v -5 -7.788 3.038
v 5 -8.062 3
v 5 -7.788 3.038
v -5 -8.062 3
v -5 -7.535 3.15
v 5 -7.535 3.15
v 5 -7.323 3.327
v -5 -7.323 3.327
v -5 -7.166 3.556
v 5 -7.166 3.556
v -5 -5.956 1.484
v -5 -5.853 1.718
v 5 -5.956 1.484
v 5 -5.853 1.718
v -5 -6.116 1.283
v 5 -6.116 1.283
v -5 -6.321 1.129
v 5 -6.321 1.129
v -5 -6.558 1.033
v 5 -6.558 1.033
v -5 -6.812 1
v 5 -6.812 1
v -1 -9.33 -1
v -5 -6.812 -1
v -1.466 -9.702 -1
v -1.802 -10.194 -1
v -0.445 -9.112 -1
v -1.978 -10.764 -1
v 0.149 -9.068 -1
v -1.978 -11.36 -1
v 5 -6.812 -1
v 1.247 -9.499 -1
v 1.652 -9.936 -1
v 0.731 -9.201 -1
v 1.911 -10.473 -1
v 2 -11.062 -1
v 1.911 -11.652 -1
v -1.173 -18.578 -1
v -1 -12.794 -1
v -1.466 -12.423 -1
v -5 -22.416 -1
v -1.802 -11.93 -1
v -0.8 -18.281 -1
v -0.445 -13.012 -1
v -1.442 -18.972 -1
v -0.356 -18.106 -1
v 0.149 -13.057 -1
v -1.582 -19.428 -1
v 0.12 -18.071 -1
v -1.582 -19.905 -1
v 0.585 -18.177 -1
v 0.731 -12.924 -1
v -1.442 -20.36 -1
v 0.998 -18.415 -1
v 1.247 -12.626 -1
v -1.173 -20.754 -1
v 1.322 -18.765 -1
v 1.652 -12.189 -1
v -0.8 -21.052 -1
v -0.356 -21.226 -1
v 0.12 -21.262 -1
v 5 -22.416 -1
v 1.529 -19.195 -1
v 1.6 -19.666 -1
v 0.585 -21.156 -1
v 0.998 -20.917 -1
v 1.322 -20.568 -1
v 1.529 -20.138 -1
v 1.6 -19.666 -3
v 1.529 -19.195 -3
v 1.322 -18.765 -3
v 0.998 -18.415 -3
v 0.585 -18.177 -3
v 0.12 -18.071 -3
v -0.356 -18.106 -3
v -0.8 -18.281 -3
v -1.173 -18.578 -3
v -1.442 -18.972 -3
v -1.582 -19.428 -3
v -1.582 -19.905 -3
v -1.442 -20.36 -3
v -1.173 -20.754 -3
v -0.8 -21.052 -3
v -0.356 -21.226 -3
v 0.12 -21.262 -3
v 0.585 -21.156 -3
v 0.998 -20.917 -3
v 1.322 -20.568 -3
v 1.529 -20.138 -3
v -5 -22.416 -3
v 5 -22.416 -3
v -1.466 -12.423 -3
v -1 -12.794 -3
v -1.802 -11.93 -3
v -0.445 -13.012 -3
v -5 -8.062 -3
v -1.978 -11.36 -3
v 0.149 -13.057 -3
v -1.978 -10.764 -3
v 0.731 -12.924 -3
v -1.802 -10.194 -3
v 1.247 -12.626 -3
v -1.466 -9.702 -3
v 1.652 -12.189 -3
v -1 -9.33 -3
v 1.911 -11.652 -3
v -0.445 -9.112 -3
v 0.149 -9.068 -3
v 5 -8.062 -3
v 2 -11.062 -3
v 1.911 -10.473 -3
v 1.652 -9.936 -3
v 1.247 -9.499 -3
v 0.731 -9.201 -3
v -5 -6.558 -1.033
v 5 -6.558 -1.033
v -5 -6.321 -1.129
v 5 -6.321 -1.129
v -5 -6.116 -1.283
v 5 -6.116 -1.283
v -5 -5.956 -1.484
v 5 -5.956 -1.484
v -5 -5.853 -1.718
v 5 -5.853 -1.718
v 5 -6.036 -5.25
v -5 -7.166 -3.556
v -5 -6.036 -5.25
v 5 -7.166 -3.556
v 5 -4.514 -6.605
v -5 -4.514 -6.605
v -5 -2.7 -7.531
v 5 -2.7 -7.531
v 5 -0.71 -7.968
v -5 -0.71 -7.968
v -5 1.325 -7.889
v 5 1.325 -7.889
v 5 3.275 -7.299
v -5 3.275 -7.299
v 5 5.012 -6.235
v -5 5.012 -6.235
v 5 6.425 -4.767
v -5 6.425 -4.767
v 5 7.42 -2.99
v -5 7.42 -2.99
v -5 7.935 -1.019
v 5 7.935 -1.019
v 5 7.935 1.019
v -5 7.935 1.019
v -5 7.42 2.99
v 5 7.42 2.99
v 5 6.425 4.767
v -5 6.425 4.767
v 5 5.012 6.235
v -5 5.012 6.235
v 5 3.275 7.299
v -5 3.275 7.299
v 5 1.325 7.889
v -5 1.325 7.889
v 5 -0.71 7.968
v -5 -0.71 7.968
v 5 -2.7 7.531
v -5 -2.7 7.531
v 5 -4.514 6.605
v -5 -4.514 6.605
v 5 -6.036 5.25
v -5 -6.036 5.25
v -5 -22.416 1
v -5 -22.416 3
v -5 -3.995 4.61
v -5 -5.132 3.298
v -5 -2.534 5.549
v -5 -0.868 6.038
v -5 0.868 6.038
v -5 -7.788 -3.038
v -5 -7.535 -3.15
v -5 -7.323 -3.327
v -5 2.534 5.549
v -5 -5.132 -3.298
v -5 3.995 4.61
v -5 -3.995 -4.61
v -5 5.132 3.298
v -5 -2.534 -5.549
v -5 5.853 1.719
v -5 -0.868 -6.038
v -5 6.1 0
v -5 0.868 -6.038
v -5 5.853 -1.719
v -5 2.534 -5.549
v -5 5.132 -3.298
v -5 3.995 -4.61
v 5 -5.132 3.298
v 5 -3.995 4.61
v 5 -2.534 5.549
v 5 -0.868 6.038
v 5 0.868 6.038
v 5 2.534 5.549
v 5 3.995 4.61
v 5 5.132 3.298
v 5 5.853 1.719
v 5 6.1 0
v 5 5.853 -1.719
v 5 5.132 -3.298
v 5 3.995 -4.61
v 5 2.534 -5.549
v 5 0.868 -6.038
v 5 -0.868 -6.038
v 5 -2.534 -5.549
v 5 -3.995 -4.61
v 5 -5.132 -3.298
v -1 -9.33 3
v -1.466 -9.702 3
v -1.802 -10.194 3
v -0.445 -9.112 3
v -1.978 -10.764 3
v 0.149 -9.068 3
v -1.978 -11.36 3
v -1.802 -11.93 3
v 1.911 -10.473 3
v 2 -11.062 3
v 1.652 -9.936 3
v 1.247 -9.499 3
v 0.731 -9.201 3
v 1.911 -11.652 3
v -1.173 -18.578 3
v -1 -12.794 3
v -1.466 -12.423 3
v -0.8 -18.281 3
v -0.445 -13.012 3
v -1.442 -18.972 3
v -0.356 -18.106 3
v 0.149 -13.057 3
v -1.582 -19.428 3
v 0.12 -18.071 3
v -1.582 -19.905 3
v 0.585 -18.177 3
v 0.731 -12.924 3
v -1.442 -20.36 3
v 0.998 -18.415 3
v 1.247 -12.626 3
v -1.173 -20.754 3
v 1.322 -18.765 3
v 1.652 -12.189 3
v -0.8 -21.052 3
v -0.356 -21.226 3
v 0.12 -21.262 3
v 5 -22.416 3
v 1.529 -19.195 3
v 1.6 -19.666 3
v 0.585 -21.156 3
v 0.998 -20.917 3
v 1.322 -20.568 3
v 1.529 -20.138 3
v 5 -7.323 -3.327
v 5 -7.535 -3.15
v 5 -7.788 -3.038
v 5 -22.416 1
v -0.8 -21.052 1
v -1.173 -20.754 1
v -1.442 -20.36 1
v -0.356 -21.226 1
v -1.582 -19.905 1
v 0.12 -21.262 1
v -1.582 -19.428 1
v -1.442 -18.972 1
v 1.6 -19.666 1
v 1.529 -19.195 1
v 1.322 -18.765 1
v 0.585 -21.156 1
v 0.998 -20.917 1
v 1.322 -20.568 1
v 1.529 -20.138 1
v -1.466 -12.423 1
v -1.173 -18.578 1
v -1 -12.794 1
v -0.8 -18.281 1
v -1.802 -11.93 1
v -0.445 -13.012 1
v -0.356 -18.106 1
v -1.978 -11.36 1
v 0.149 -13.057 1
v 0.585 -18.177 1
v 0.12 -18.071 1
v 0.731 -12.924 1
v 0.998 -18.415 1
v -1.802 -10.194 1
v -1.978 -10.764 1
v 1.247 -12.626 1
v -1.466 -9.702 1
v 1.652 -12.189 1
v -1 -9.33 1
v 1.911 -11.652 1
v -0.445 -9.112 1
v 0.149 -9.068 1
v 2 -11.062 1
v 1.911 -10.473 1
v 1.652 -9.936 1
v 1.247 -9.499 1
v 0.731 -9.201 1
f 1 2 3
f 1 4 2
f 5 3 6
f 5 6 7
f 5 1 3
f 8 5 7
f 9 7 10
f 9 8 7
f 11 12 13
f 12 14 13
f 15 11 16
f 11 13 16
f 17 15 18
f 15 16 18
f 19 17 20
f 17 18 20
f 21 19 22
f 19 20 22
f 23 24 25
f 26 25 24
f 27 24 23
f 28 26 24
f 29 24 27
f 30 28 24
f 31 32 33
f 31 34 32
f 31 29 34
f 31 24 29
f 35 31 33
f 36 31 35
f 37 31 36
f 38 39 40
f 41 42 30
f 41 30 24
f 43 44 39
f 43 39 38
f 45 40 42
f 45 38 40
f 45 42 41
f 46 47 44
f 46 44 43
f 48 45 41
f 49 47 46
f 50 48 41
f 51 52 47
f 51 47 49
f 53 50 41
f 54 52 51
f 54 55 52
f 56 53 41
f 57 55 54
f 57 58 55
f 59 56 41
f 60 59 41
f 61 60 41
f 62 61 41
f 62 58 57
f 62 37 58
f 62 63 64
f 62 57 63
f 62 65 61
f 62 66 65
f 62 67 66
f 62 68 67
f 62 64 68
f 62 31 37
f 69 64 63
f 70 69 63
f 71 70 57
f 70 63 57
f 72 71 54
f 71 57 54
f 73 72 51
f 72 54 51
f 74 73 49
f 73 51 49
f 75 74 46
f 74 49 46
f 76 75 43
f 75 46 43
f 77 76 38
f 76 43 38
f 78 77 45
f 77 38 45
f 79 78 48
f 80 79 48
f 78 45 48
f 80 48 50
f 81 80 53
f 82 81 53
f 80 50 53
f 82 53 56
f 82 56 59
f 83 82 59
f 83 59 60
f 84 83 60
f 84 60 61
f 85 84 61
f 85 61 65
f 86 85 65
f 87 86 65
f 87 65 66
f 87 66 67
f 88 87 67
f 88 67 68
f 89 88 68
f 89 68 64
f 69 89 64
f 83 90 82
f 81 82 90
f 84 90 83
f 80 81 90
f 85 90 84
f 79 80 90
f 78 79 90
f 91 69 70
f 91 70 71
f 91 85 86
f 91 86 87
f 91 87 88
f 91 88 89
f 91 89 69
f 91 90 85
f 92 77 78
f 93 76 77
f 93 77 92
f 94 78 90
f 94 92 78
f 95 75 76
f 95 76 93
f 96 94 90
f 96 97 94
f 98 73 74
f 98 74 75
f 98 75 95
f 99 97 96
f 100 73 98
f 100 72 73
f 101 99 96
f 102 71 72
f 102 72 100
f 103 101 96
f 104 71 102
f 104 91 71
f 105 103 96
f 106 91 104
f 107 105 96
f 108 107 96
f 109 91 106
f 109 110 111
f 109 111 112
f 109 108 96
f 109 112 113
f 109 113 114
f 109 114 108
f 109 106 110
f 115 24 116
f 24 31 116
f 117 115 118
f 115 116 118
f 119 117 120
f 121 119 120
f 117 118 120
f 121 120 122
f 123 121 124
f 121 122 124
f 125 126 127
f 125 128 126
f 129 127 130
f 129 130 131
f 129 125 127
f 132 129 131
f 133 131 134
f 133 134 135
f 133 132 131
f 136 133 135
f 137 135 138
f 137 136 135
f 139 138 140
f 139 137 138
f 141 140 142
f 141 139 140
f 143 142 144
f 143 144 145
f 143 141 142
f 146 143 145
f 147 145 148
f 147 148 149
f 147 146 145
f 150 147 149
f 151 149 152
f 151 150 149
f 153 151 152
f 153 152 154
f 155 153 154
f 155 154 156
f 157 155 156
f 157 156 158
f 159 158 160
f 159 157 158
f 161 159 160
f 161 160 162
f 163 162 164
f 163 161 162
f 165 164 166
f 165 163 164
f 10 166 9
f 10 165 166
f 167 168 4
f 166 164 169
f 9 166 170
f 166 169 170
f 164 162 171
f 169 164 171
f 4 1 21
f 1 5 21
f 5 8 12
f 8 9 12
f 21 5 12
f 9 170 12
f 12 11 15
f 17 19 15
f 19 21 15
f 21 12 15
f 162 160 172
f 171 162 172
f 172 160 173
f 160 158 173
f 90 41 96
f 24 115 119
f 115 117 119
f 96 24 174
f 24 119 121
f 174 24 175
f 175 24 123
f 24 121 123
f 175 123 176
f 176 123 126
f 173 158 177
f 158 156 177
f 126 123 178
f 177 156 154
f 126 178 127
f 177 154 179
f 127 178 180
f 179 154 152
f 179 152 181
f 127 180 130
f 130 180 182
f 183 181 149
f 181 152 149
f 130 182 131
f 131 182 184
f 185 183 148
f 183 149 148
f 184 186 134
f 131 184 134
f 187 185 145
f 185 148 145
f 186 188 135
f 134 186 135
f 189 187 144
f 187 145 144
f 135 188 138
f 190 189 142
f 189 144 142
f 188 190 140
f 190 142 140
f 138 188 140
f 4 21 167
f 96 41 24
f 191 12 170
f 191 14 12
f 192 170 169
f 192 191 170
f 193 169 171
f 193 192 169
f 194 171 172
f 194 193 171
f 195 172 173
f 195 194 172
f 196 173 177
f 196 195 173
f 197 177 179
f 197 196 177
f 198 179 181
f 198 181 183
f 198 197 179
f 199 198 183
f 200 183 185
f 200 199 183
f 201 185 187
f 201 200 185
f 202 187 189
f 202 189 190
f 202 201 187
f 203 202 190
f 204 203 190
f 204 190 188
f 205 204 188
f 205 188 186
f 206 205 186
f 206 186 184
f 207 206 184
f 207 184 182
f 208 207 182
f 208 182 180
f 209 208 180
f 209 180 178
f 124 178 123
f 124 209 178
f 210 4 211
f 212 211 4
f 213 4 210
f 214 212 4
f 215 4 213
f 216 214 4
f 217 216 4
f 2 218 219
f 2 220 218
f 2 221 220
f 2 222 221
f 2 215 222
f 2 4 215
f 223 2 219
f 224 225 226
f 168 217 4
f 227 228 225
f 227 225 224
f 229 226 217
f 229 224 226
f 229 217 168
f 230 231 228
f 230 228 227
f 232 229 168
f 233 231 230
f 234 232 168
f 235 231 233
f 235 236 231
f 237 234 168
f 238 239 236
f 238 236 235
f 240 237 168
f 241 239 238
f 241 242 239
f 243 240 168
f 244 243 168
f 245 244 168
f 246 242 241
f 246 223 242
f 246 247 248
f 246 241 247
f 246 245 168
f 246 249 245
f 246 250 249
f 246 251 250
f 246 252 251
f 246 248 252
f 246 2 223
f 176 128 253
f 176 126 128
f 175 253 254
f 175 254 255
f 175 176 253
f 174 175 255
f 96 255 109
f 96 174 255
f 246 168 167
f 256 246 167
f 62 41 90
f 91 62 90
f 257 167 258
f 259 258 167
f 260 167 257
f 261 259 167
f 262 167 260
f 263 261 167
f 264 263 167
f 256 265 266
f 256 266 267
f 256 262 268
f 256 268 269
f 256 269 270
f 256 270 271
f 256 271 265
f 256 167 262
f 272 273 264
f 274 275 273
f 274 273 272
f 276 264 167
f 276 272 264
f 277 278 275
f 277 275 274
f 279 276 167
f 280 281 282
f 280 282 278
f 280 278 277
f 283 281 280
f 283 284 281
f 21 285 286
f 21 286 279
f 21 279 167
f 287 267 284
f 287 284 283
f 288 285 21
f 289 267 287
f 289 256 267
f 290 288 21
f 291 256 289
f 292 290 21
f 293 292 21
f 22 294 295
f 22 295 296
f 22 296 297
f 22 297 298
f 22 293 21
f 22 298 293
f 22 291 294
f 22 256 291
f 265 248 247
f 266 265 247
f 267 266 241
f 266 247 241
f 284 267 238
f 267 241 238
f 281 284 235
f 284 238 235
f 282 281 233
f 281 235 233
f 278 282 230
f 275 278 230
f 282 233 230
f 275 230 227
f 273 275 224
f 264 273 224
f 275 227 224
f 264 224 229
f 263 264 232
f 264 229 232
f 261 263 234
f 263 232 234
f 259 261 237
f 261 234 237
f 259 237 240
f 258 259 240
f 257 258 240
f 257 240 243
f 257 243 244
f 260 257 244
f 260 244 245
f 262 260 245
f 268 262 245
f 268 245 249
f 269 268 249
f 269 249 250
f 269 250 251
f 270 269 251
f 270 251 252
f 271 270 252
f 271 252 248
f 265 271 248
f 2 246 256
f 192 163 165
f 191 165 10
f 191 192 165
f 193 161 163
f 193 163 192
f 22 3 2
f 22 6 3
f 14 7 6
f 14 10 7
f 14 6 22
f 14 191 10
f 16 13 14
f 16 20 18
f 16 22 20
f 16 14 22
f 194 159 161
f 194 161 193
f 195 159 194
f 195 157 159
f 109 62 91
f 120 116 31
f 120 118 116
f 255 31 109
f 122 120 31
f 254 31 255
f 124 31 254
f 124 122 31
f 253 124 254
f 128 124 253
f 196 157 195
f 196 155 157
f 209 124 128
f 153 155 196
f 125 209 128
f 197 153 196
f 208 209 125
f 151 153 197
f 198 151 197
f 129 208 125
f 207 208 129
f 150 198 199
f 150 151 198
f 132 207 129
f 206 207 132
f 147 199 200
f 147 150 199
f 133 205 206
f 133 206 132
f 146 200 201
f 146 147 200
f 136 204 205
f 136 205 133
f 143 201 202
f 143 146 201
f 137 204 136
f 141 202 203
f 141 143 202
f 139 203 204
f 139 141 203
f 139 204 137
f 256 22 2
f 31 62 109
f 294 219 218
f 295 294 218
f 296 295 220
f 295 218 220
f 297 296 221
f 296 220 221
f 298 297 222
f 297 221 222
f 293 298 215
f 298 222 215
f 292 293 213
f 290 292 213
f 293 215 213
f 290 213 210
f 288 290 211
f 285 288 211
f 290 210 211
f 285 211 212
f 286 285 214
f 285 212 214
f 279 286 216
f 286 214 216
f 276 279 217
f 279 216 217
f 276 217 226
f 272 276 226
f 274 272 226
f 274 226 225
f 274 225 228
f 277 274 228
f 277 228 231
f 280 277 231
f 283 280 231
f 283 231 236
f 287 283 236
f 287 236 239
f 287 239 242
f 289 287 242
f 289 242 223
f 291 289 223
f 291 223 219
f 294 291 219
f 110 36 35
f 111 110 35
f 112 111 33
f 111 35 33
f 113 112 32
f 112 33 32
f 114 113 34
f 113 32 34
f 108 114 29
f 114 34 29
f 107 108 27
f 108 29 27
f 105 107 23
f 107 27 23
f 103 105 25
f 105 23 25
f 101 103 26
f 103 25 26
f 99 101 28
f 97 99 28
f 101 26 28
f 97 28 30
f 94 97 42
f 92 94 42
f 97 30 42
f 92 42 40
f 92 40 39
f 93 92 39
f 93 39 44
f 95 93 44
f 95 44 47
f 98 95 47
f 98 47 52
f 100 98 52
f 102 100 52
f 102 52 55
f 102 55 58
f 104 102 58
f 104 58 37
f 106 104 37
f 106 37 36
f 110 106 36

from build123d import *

# Parameters (mm, degrees)
BOSS_EXTRUDE1_DEPTH = 5
FILLET1_R           = 1
SKETCH3_R           = 1.6
SKETCH3_R_2         = 2
CUT_EXTRUDE1_DEPTH  = 26.465387384


with BuildPart() as part:
    # Sketch1 → Boss-Extrude1 (new, symmetric)
    with BuildSketch(Plane(origin=(0, 0, 0), x_dir=(0, 0, -1), z_dir=(1, 0, 0))):
        with BuildLine():
            Line((-3, -7.416198487), (-3, -22.416198487))
            Line((-3, -22.416198487), (-1, -22.416198487))
            Line((-1, -22.416198487), (-1, -6.017474553))
            ThreePointArc((-1, -6.017474553), (0, 6.1), (1, -6.017474553))
            Line((1, -6.017474553), (1, -22.416198487))
            Line((1, -22.416198487), (3, -22.416198487))
            Line((3, -22.416198487), (3, -7.416198487))
            ThreePointArc((3, -7.416198487), (0, 8), (-3, -7.416198487))
        make_face()
    extrude(amount=BOSS_EXTRUDE1_DEPTH, both=True)

    # Fillet1
    fillet1_edges = [part.edges().sort_by_distance(p)[0] for p in [
        (0, -6.017474553, 1),
        (0, -7.416198487, 3),
        (0, -7.416198487, -3),
        (0, -6.017474553, -1),
    ]]
    fillet(fillet1_edges, radius=FILLET1_R)

    # Sketch3 → Cut-Extrude1 (cut, through all)
    with BuildSketch(Plane.XY.offset(3)):
        with Locations((0, -19.666198487)):
            Circle(SKETCH3_R)
        with Locations((0, -11.062257748)):
            Circle(SKETCH3_R_2)
    extrude(amount=-CUT_EXTRUDE1_DEPTH, mode=Mode.SUBTRACT)


solid = part.part
